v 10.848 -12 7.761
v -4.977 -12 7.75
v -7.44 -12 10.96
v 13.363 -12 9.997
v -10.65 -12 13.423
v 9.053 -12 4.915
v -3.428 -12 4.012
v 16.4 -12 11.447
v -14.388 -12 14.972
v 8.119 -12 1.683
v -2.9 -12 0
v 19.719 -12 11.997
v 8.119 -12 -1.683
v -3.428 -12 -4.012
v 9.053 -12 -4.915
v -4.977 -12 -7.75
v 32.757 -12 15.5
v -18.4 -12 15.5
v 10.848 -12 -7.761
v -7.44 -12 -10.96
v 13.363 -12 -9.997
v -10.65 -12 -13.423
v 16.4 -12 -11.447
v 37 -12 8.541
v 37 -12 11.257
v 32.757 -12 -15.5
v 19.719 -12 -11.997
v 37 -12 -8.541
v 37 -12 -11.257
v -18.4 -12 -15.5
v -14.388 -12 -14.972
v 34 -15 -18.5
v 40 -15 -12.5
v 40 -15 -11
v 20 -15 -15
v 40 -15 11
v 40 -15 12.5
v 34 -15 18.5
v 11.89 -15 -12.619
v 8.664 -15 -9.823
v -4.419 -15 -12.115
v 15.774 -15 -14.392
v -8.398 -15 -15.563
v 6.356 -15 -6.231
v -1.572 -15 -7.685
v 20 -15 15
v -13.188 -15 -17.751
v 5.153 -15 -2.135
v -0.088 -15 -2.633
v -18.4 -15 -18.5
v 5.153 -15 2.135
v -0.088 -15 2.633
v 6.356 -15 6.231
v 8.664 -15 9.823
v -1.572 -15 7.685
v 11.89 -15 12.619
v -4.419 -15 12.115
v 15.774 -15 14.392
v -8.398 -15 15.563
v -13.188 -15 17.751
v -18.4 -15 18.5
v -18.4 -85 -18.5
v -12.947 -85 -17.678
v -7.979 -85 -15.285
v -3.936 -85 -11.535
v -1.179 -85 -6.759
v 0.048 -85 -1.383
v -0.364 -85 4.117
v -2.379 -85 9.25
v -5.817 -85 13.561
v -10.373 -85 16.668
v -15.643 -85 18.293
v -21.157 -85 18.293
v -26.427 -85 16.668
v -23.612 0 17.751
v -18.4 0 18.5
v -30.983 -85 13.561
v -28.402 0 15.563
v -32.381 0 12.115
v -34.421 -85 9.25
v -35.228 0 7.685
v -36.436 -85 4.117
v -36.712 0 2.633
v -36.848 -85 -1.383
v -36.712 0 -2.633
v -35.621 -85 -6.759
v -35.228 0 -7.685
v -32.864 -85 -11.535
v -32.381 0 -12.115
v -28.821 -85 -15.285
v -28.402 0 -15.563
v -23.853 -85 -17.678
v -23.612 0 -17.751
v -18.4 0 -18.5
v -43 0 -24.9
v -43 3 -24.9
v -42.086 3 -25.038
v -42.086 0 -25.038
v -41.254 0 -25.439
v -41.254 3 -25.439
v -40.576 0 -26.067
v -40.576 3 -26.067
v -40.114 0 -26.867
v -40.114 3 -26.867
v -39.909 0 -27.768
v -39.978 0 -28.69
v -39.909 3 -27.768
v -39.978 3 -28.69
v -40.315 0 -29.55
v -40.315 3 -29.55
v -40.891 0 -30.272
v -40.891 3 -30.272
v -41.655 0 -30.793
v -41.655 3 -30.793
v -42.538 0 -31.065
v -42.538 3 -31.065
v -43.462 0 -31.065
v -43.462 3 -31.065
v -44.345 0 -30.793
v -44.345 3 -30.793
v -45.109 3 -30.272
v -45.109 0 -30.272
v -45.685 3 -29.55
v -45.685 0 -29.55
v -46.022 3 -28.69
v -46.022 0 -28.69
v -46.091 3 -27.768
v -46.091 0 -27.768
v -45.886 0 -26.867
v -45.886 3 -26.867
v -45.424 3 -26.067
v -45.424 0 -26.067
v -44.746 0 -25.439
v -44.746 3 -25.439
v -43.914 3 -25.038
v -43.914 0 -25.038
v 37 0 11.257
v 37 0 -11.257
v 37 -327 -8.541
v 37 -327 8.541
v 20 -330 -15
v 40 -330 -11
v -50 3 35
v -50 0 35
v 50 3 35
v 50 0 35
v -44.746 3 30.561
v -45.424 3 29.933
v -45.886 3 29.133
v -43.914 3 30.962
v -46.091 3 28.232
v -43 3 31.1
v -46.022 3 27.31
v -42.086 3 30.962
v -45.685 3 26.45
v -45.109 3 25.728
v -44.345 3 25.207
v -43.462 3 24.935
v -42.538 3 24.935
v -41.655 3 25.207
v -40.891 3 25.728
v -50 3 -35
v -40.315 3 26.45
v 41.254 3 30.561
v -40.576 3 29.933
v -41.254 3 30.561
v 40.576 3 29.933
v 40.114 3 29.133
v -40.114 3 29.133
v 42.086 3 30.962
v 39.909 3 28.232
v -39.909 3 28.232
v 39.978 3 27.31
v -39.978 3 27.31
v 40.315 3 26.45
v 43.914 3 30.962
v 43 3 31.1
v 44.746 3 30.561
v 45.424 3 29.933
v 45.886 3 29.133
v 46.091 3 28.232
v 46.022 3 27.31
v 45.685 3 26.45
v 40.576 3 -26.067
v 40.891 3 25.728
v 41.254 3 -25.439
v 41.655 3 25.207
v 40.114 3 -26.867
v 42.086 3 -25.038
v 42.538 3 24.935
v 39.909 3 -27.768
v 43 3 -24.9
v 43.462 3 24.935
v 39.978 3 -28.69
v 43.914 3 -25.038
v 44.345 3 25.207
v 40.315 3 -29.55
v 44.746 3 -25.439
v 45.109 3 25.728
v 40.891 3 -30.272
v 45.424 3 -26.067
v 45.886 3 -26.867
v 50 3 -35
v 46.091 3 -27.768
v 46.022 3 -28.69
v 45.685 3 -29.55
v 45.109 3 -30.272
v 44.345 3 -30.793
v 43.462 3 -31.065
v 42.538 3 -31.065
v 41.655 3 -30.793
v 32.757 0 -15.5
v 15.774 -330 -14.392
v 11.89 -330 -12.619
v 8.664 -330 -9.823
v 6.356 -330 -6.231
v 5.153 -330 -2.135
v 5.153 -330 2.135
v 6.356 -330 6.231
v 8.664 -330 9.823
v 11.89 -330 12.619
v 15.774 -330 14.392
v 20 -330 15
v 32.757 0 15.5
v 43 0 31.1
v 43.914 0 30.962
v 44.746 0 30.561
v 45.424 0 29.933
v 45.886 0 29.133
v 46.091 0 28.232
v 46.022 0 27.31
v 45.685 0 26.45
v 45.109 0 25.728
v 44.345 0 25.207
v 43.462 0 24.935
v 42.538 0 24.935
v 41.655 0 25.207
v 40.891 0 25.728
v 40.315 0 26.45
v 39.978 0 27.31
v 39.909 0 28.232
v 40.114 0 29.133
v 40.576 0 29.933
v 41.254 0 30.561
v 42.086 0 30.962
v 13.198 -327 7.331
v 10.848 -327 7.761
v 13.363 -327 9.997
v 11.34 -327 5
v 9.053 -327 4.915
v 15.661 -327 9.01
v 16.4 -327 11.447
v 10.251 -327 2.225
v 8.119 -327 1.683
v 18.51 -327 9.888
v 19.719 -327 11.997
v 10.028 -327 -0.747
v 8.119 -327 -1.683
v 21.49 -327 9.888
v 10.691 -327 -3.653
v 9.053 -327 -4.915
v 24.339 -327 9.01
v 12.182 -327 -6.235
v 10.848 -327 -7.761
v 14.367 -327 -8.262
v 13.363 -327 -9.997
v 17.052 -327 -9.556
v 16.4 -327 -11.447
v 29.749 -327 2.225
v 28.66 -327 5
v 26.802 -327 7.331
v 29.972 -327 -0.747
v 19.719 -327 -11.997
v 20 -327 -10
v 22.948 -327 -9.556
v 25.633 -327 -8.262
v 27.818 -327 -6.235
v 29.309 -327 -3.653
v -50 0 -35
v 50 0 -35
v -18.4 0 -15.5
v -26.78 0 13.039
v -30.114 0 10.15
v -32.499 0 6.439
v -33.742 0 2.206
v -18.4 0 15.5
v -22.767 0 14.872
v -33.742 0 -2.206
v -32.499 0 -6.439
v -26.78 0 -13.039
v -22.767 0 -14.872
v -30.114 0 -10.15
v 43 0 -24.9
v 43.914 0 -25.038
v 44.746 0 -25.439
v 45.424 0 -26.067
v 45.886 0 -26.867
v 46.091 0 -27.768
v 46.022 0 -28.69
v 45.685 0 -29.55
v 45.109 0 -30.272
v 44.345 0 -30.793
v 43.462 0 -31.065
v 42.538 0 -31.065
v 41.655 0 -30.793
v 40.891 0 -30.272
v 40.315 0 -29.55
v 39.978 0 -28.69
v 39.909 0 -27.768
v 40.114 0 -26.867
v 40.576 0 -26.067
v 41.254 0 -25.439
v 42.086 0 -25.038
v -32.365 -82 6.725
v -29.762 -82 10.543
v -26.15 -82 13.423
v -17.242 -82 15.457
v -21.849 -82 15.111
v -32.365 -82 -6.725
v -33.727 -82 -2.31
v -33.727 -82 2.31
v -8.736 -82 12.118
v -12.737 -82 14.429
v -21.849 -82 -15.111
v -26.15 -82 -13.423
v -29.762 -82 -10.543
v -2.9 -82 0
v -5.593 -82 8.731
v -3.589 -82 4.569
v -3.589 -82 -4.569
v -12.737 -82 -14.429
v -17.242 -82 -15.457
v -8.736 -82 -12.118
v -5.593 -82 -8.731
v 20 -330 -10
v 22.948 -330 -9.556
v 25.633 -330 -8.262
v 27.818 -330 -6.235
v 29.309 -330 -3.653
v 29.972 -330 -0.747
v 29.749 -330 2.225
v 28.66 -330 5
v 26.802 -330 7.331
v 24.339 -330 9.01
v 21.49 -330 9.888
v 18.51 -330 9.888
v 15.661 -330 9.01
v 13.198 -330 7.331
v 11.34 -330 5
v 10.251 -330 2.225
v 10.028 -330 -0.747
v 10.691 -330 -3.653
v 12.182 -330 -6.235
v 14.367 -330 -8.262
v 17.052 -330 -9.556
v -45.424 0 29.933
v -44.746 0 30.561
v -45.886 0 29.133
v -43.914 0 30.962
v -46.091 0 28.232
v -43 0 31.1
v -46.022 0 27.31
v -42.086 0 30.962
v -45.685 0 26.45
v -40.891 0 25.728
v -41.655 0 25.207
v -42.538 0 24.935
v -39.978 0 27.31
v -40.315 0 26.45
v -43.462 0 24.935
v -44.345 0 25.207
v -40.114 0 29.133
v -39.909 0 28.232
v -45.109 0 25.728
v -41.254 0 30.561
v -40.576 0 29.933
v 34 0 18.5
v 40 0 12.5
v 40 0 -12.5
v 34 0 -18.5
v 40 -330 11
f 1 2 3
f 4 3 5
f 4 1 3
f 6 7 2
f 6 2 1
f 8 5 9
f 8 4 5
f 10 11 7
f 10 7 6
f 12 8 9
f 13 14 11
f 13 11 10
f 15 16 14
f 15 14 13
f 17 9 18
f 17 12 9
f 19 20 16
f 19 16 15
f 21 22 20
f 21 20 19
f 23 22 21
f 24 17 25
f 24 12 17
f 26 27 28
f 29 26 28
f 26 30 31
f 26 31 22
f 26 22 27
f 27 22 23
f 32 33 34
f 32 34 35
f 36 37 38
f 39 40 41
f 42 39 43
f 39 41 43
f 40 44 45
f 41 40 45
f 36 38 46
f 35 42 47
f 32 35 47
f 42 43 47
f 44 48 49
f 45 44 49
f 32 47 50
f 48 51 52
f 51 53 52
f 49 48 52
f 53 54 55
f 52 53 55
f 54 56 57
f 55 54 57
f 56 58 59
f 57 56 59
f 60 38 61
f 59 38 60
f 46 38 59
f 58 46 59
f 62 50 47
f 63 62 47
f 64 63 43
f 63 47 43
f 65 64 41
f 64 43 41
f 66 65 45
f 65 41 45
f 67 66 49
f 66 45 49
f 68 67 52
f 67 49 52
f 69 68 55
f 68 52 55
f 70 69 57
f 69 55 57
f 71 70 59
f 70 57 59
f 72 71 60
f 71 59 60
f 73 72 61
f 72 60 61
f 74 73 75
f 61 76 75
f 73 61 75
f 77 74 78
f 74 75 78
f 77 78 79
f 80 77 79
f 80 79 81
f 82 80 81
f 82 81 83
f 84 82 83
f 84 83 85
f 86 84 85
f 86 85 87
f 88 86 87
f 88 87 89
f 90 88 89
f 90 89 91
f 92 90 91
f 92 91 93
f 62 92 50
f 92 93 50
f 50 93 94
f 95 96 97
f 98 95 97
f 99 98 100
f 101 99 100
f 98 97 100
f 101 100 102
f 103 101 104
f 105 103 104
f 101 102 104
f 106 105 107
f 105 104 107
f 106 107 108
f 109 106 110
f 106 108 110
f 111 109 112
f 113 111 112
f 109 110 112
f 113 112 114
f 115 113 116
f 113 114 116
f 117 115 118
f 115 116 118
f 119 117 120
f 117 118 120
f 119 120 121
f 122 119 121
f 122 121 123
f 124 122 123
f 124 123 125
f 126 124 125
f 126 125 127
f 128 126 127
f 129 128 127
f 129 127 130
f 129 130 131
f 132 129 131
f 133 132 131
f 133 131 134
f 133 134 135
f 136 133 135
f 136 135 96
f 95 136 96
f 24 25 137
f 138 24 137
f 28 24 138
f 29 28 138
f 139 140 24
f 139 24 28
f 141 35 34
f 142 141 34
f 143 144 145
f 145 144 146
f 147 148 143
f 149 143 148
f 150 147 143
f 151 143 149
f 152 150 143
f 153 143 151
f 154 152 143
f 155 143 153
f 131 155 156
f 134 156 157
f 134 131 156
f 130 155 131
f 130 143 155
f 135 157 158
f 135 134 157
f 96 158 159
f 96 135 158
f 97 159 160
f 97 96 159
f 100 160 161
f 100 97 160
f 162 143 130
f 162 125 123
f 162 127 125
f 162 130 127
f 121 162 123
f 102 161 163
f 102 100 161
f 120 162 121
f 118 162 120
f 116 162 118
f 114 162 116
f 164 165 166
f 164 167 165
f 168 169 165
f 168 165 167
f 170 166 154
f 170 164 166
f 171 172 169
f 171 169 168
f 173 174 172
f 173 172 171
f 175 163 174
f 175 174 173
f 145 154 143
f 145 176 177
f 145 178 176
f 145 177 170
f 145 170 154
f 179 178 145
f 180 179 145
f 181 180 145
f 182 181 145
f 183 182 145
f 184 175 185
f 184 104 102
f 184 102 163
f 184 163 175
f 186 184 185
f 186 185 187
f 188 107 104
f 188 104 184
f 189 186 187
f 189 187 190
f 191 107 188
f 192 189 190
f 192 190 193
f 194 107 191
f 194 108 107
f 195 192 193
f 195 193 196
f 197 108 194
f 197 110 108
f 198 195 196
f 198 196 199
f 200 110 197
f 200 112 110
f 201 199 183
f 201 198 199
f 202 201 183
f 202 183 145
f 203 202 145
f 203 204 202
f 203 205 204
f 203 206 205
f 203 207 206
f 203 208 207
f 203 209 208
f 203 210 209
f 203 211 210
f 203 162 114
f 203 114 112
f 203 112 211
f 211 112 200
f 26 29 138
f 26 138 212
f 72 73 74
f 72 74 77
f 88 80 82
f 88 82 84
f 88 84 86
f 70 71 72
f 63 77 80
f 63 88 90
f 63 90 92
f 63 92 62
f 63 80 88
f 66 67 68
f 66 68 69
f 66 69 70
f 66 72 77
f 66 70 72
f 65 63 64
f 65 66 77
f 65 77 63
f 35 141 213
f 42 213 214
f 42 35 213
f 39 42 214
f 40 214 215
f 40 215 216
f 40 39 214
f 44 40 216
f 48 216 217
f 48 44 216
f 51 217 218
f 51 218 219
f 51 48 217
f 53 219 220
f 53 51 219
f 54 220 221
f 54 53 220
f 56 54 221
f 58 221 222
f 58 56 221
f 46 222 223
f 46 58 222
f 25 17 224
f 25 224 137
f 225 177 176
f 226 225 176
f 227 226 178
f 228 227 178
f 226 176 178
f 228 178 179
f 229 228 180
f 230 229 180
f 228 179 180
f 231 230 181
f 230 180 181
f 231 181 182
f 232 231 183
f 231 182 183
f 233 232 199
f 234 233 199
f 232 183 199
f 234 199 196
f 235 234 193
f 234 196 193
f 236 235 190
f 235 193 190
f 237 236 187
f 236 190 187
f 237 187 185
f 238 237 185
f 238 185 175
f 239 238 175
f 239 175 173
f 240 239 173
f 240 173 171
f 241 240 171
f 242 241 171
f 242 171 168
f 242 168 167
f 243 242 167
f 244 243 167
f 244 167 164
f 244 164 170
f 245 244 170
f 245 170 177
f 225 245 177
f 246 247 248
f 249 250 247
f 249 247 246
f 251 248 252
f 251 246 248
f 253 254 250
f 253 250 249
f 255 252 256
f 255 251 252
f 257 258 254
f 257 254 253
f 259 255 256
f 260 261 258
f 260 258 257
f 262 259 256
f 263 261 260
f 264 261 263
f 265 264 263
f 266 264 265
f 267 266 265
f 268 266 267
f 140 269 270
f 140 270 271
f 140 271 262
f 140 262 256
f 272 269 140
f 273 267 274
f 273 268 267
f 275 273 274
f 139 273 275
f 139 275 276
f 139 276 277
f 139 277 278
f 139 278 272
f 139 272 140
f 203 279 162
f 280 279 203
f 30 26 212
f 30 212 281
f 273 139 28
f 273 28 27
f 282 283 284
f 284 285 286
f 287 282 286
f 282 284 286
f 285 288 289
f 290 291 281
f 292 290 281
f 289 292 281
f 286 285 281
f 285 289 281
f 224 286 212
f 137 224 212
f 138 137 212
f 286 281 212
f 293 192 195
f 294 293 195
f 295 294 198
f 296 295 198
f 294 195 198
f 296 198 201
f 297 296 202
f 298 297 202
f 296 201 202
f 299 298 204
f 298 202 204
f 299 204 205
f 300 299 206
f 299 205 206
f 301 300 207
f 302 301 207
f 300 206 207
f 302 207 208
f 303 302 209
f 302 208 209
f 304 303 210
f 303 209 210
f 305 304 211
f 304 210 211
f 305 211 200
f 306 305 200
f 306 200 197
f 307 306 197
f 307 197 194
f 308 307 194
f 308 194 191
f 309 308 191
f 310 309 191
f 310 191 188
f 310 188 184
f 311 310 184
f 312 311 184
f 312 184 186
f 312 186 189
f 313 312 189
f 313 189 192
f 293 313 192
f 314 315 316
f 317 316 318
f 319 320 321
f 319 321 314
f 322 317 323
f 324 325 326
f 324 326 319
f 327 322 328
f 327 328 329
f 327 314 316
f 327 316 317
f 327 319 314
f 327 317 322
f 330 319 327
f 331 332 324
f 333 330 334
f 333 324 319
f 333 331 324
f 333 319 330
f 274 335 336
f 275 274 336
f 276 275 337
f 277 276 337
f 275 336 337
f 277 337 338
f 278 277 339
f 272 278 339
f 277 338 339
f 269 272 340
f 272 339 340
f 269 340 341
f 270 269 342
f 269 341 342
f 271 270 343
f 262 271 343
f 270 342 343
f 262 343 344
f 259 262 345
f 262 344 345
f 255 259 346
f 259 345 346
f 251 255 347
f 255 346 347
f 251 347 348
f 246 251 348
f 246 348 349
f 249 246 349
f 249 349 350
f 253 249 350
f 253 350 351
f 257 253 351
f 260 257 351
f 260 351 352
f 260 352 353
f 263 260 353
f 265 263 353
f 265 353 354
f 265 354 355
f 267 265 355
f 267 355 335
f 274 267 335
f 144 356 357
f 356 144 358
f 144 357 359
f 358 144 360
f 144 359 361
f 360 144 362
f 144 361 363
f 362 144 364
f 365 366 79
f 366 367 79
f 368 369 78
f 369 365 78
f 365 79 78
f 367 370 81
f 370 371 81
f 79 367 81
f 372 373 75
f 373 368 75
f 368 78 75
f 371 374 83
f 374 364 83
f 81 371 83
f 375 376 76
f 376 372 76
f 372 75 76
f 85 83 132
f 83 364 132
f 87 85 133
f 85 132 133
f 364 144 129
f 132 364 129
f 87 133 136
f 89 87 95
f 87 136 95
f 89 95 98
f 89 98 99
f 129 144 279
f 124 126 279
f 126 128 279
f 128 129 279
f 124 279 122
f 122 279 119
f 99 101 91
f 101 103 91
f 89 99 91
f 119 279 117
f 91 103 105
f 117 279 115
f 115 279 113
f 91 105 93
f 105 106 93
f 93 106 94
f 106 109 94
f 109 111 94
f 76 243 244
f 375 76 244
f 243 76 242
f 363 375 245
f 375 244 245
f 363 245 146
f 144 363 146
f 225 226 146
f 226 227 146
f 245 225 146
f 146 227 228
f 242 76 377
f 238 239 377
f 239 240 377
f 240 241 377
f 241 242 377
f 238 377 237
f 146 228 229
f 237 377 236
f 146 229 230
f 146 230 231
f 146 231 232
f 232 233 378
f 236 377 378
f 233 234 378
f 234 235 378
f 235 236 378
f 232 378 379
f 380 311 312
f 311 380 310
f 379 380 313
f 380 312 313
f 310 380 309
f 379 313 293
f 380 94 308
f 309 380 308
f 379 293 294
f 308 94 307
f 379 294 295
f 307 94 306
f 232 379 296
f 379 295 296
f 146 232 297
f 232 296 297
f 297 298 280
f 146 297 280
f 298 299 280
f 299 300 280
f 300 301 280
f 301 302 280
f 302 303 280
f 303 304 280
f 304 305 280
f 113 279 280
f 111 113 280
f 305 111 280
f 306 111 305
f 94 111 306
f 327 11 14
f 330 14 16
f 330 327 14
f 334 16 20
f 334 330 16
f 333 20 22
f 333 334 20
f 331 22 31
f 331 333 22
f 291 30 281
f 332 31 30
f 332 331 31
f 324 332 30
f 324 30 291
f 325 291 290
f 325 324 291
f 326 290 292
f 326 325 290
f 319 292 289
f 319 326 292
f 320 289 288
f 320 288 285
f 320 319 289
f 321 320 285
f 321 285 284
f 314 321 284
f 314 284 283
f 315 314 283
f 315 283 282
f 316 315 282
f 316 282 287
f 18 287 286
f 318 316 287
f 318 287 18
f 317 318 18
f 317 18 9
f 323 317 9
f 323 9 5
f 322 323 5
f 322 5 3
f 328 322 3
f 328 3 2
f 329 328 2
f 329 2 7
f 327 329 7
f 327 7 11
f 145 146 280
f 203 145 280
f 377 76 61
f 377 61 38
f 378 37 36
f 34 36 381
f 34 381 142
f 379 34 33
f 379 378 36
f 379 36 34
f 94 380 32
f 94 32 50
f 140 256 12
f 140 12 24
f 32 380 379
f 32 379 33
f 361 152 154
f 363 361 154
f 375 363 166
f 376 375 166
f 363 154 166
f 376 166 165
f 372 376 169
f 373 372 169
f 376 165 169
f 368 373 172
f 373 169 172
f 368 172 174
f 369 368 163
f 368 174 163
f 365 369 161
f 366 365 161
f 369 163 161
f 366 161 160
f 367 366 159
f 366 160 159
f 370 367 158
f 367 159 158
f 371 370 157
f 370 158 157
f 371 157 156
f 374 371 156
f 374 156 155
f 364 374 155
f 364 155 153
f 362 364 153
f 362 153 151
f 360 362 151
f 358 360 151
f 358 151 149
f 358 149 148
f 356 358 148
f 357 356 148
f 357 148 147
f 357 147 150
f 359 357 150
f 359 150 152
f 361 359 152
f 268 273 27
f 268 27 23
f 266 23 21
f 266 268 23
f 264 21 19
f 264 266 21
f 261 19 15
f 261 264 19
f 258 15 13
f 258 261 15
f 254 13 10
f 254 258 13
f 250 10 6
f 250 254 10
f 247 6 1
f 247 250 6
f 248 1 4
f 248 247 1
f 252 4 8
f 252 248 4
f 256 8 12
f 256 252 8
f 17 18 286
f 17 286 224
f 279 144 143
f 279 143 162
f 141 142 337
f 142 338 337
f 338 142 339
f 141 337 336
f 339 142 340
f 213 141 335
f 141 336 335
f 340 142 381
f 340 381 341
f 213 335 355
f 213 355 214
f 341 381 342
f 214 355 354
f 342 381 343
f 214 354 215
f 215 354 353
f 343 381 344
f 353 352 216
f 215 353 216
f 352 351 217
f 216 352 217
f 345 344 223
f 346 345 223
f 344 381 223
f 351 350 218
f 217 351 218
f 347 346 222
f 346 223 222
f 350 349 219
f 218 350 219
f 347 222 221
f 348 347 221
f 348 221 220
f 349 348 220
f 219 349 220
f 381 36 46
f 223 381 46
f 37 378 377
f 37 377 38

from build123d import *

# Parameters (mm, degrees)
SKETCH_1_W                  = 100
SKETCH_1_H                  = 70
EXTRUDE_1_DEPTH             = 3
SKETCH_2_R                  = 3.1
CUT_EXTRUDE_1_DEPTH         = 62.10646447
PATTERN_LINEAR_2_COUNT      = 2
PATTERN_LINEAR_2_PITCH      = 56
PATTERN_LINEAR_2_COUNT_DIR2 = 2
PATTERN_LINEAR_2_PITCH_DIR2 = 86
EXTRUDE_2_DEPTH             = 15
CHAMFER_2_SIZE              = 6
SKETCH_4_R                  = 18.5
EXTRUDE_3_DEPTH             = 70
EXTRUDE_4_DEPTH             = 315
SHELL_START                 = -327
SHELL_5_DEPTH               = 327
SHELL_START_2               = -82
SHELL_5_2_OUTLINE_R         = 15.5
SHELL_5_2_DEPTH             = 82
SHELL_START_3               = -12
SHELL_5_3_DEPTH             = 12
CUT_EXTRUDE_2_REACH         = 340.547
SKETCH_6_R                  = 10


# Read off the part's stored shape, not the designer's step: 抽壳5
with BuildPart() as part:
    # 草图1 → 凸台-拉伸1 (new body)
    with BuildSketch(Plane(origin=(0, 0, 0), x_dir=(1, 0, 0), z_dir=(0, 1, 0))):
        Rectangle(SKETCH_1_W, SKETCH_1_H)
    extrude(amount=EXTRUDE_1_DEPTH)

    # 草图2 → 切除-拉伸1 (cut, through all)
    with BuildSketch(Plane(origin=(0, 3, 0), x_dir=(1, 0, 0), z_dir=(0, 1, 0))):
        with Locations(Location((-43, 28, 0), (0, 0, 270))):
            Circle(SKETCH_2_R)
    cut_extrude_1 = extrude(amount=-CUT_EXTRUDE_1_DEPTH, mode=Mode.SUBTRACT)

    # 阵列(线性)2: Cut-Extrude 1 2 × 2
    with Locations(*[(j * PATTERN_LINEAR_2_PITCH_DIR2, 0, i * PATTERN_LINEAR_2_PITCH) for i in range(PATTERN_LINEAR_2_COUNT) for j in range(PATTERN_LINEAR_2_COUNT_DIR2) if (i, j) != (0, 0)]):
        add(cut_extrude_1, mode=Mode.SUBTRACT)

    # 草图3 → 凸台-拉伸2 (add)
    with BuildSketch(Plane.XZ):
        with BuildLine():
            Line((-18.4, 18.5), (40, 18.5))
            Line((40, 18.5), (40, -18.5))
            Line((40, -18.5), (-18.4, -18.5))
            ThreePointArc((-18.4, -18.5), (-36.9, 0), (-18.4, 18.5))
        make_face()
    extrude(amount=EXTRUDE_2_DEPTH)

    # 倒角2
    chamfer_2_edges = [part.edges().sort_by_distance(p)[0] for p in [
        (40, -7.5, -18.5),
        (40, -7.5, 18.5),
    ]]
    chamfer(chamfer_2_edges, length=CHAMFER_2_SIZE)

    # 草图4 → 凸台-拉伸3 (add)
    with BuildSketch(Plane(origin=(0, -15, 0), x_dir=(-1, 0, 0), z_dir=(0, -1, 0))):
        with Locations(Location((18.4, 0, 0), (0, 0, 90))):
            Circle(SKETCH_4_R)
    extrude(amount=EXTRUDE_3_DEPTH)

    # 草图5 → 凸台-拉伸4 (add)
    with BuildSketch(Plane.XZ.offset(15)):
        with BuildLine():
            ThreePointArc((20, -15), (5, 0), (20, 15))
            Line((20, 15), (20, -15))
        make_face()
        Polygon((20, -15), (40, -11), (40, 11), (20, 15), align=None)
    extrude(amount=EXTRUDE_4_DEPTH)

    # 抽壳5 outline → 抽壳5 (cut)
    with BuildSketch(Plane(origin=(0, 0, 0), x_dir=(1, 0, 0), z_dir=(0, 1, 0)).offset(SHELL_START)):
        with BuildLine():
            Line((37, -8.540588292), (37, 8.540588292))
            Line((37, 8.540588292), (19.719352649, 11.996717762))
            ThreePointArc((19.719352649, 11.996717762), (8, 0), (19.719352649, -11.996717762))
            Line((19.719352649, -11.996717762), (37, -8.540588292))
        make_face()
    extrude(amount=SHELL_5_DEPTH, mode=Mode.SUBTRACT)

    # Shell 5 2 outline → Shell 5 2 (cut)
    with BuildSketch(Plane(origin=(0, 0, 0), x_dir=(1, 0, 0), z_dir=(0, 1, 0)).offset(SHELL_START_2)):
        with Locations((-18.4, 0)):
            Circle(SHELL_5_2_OUTLINE_R)
    extrude(amount=SHELL_5_2_DEPTH, mode=Mode.SUBTRACT)

    # Shell 5 3 outline → Shell 5 3 (cut)
    with BuildSketch(Plane(origin=(0, 0, 0), x_dir=(1, 0, 0), z_dir=(0, 1, 0)).offset(SHELL_START_3)):
        with BuildLine():
            Line((32.757359313, 15.5), (-18.4, 15.5))
            ThreePointArc((-18.4, 15.5), (-2.9, 0), (-18.4, -15.5))
            Line((-18.4, -15.5), (32.757359313, -15.5))
            Line((32.757359313, -15.5), (37, -11.257359313))
            Line((37, -11.257359313), (37, -8.540588292))
            Line((37, -8.540588292), (19.719352649, -11.996717762))
            ThreePointArc((19.719352649, -11.996717762), (8, 0), (19.719352649, 11.996717762))
            Line((19.719352649, 11.996717762), (37, 8.540588292))
            Line((37, 8.540588292), (37, 11.257359313))
            Line((37, 11.257359313), (32.757359313, 15.5))
        make_face()
    extrude(amount=SHELL_5_3_DEPTH, mode=Mode.SUBTRACT)

    # 草图6 → 切除-拉伸2 (cut, up to next)
    with BuildSketch(Plane.XZ.offset(330), mode=Mode.PRIVATE) as cut_extrude_2_sk1:
        with Locations(Location((20, 0, 0), (0, 0, 270))):
            Circle(SKETCH_6_R)
    cut_extrude_2_tool1 = extrude(cut_extrude_2_sk1.sketch, amount=-CUT_EXTRUDE_2_REACH, mode=Mode.PRIVATE) & part.part
    add(cut_extrude_2_tool1.solids().sort_by_distance((20, -330, 0))[0], mode=Mode.SUBTRACT)


solid = part.part
